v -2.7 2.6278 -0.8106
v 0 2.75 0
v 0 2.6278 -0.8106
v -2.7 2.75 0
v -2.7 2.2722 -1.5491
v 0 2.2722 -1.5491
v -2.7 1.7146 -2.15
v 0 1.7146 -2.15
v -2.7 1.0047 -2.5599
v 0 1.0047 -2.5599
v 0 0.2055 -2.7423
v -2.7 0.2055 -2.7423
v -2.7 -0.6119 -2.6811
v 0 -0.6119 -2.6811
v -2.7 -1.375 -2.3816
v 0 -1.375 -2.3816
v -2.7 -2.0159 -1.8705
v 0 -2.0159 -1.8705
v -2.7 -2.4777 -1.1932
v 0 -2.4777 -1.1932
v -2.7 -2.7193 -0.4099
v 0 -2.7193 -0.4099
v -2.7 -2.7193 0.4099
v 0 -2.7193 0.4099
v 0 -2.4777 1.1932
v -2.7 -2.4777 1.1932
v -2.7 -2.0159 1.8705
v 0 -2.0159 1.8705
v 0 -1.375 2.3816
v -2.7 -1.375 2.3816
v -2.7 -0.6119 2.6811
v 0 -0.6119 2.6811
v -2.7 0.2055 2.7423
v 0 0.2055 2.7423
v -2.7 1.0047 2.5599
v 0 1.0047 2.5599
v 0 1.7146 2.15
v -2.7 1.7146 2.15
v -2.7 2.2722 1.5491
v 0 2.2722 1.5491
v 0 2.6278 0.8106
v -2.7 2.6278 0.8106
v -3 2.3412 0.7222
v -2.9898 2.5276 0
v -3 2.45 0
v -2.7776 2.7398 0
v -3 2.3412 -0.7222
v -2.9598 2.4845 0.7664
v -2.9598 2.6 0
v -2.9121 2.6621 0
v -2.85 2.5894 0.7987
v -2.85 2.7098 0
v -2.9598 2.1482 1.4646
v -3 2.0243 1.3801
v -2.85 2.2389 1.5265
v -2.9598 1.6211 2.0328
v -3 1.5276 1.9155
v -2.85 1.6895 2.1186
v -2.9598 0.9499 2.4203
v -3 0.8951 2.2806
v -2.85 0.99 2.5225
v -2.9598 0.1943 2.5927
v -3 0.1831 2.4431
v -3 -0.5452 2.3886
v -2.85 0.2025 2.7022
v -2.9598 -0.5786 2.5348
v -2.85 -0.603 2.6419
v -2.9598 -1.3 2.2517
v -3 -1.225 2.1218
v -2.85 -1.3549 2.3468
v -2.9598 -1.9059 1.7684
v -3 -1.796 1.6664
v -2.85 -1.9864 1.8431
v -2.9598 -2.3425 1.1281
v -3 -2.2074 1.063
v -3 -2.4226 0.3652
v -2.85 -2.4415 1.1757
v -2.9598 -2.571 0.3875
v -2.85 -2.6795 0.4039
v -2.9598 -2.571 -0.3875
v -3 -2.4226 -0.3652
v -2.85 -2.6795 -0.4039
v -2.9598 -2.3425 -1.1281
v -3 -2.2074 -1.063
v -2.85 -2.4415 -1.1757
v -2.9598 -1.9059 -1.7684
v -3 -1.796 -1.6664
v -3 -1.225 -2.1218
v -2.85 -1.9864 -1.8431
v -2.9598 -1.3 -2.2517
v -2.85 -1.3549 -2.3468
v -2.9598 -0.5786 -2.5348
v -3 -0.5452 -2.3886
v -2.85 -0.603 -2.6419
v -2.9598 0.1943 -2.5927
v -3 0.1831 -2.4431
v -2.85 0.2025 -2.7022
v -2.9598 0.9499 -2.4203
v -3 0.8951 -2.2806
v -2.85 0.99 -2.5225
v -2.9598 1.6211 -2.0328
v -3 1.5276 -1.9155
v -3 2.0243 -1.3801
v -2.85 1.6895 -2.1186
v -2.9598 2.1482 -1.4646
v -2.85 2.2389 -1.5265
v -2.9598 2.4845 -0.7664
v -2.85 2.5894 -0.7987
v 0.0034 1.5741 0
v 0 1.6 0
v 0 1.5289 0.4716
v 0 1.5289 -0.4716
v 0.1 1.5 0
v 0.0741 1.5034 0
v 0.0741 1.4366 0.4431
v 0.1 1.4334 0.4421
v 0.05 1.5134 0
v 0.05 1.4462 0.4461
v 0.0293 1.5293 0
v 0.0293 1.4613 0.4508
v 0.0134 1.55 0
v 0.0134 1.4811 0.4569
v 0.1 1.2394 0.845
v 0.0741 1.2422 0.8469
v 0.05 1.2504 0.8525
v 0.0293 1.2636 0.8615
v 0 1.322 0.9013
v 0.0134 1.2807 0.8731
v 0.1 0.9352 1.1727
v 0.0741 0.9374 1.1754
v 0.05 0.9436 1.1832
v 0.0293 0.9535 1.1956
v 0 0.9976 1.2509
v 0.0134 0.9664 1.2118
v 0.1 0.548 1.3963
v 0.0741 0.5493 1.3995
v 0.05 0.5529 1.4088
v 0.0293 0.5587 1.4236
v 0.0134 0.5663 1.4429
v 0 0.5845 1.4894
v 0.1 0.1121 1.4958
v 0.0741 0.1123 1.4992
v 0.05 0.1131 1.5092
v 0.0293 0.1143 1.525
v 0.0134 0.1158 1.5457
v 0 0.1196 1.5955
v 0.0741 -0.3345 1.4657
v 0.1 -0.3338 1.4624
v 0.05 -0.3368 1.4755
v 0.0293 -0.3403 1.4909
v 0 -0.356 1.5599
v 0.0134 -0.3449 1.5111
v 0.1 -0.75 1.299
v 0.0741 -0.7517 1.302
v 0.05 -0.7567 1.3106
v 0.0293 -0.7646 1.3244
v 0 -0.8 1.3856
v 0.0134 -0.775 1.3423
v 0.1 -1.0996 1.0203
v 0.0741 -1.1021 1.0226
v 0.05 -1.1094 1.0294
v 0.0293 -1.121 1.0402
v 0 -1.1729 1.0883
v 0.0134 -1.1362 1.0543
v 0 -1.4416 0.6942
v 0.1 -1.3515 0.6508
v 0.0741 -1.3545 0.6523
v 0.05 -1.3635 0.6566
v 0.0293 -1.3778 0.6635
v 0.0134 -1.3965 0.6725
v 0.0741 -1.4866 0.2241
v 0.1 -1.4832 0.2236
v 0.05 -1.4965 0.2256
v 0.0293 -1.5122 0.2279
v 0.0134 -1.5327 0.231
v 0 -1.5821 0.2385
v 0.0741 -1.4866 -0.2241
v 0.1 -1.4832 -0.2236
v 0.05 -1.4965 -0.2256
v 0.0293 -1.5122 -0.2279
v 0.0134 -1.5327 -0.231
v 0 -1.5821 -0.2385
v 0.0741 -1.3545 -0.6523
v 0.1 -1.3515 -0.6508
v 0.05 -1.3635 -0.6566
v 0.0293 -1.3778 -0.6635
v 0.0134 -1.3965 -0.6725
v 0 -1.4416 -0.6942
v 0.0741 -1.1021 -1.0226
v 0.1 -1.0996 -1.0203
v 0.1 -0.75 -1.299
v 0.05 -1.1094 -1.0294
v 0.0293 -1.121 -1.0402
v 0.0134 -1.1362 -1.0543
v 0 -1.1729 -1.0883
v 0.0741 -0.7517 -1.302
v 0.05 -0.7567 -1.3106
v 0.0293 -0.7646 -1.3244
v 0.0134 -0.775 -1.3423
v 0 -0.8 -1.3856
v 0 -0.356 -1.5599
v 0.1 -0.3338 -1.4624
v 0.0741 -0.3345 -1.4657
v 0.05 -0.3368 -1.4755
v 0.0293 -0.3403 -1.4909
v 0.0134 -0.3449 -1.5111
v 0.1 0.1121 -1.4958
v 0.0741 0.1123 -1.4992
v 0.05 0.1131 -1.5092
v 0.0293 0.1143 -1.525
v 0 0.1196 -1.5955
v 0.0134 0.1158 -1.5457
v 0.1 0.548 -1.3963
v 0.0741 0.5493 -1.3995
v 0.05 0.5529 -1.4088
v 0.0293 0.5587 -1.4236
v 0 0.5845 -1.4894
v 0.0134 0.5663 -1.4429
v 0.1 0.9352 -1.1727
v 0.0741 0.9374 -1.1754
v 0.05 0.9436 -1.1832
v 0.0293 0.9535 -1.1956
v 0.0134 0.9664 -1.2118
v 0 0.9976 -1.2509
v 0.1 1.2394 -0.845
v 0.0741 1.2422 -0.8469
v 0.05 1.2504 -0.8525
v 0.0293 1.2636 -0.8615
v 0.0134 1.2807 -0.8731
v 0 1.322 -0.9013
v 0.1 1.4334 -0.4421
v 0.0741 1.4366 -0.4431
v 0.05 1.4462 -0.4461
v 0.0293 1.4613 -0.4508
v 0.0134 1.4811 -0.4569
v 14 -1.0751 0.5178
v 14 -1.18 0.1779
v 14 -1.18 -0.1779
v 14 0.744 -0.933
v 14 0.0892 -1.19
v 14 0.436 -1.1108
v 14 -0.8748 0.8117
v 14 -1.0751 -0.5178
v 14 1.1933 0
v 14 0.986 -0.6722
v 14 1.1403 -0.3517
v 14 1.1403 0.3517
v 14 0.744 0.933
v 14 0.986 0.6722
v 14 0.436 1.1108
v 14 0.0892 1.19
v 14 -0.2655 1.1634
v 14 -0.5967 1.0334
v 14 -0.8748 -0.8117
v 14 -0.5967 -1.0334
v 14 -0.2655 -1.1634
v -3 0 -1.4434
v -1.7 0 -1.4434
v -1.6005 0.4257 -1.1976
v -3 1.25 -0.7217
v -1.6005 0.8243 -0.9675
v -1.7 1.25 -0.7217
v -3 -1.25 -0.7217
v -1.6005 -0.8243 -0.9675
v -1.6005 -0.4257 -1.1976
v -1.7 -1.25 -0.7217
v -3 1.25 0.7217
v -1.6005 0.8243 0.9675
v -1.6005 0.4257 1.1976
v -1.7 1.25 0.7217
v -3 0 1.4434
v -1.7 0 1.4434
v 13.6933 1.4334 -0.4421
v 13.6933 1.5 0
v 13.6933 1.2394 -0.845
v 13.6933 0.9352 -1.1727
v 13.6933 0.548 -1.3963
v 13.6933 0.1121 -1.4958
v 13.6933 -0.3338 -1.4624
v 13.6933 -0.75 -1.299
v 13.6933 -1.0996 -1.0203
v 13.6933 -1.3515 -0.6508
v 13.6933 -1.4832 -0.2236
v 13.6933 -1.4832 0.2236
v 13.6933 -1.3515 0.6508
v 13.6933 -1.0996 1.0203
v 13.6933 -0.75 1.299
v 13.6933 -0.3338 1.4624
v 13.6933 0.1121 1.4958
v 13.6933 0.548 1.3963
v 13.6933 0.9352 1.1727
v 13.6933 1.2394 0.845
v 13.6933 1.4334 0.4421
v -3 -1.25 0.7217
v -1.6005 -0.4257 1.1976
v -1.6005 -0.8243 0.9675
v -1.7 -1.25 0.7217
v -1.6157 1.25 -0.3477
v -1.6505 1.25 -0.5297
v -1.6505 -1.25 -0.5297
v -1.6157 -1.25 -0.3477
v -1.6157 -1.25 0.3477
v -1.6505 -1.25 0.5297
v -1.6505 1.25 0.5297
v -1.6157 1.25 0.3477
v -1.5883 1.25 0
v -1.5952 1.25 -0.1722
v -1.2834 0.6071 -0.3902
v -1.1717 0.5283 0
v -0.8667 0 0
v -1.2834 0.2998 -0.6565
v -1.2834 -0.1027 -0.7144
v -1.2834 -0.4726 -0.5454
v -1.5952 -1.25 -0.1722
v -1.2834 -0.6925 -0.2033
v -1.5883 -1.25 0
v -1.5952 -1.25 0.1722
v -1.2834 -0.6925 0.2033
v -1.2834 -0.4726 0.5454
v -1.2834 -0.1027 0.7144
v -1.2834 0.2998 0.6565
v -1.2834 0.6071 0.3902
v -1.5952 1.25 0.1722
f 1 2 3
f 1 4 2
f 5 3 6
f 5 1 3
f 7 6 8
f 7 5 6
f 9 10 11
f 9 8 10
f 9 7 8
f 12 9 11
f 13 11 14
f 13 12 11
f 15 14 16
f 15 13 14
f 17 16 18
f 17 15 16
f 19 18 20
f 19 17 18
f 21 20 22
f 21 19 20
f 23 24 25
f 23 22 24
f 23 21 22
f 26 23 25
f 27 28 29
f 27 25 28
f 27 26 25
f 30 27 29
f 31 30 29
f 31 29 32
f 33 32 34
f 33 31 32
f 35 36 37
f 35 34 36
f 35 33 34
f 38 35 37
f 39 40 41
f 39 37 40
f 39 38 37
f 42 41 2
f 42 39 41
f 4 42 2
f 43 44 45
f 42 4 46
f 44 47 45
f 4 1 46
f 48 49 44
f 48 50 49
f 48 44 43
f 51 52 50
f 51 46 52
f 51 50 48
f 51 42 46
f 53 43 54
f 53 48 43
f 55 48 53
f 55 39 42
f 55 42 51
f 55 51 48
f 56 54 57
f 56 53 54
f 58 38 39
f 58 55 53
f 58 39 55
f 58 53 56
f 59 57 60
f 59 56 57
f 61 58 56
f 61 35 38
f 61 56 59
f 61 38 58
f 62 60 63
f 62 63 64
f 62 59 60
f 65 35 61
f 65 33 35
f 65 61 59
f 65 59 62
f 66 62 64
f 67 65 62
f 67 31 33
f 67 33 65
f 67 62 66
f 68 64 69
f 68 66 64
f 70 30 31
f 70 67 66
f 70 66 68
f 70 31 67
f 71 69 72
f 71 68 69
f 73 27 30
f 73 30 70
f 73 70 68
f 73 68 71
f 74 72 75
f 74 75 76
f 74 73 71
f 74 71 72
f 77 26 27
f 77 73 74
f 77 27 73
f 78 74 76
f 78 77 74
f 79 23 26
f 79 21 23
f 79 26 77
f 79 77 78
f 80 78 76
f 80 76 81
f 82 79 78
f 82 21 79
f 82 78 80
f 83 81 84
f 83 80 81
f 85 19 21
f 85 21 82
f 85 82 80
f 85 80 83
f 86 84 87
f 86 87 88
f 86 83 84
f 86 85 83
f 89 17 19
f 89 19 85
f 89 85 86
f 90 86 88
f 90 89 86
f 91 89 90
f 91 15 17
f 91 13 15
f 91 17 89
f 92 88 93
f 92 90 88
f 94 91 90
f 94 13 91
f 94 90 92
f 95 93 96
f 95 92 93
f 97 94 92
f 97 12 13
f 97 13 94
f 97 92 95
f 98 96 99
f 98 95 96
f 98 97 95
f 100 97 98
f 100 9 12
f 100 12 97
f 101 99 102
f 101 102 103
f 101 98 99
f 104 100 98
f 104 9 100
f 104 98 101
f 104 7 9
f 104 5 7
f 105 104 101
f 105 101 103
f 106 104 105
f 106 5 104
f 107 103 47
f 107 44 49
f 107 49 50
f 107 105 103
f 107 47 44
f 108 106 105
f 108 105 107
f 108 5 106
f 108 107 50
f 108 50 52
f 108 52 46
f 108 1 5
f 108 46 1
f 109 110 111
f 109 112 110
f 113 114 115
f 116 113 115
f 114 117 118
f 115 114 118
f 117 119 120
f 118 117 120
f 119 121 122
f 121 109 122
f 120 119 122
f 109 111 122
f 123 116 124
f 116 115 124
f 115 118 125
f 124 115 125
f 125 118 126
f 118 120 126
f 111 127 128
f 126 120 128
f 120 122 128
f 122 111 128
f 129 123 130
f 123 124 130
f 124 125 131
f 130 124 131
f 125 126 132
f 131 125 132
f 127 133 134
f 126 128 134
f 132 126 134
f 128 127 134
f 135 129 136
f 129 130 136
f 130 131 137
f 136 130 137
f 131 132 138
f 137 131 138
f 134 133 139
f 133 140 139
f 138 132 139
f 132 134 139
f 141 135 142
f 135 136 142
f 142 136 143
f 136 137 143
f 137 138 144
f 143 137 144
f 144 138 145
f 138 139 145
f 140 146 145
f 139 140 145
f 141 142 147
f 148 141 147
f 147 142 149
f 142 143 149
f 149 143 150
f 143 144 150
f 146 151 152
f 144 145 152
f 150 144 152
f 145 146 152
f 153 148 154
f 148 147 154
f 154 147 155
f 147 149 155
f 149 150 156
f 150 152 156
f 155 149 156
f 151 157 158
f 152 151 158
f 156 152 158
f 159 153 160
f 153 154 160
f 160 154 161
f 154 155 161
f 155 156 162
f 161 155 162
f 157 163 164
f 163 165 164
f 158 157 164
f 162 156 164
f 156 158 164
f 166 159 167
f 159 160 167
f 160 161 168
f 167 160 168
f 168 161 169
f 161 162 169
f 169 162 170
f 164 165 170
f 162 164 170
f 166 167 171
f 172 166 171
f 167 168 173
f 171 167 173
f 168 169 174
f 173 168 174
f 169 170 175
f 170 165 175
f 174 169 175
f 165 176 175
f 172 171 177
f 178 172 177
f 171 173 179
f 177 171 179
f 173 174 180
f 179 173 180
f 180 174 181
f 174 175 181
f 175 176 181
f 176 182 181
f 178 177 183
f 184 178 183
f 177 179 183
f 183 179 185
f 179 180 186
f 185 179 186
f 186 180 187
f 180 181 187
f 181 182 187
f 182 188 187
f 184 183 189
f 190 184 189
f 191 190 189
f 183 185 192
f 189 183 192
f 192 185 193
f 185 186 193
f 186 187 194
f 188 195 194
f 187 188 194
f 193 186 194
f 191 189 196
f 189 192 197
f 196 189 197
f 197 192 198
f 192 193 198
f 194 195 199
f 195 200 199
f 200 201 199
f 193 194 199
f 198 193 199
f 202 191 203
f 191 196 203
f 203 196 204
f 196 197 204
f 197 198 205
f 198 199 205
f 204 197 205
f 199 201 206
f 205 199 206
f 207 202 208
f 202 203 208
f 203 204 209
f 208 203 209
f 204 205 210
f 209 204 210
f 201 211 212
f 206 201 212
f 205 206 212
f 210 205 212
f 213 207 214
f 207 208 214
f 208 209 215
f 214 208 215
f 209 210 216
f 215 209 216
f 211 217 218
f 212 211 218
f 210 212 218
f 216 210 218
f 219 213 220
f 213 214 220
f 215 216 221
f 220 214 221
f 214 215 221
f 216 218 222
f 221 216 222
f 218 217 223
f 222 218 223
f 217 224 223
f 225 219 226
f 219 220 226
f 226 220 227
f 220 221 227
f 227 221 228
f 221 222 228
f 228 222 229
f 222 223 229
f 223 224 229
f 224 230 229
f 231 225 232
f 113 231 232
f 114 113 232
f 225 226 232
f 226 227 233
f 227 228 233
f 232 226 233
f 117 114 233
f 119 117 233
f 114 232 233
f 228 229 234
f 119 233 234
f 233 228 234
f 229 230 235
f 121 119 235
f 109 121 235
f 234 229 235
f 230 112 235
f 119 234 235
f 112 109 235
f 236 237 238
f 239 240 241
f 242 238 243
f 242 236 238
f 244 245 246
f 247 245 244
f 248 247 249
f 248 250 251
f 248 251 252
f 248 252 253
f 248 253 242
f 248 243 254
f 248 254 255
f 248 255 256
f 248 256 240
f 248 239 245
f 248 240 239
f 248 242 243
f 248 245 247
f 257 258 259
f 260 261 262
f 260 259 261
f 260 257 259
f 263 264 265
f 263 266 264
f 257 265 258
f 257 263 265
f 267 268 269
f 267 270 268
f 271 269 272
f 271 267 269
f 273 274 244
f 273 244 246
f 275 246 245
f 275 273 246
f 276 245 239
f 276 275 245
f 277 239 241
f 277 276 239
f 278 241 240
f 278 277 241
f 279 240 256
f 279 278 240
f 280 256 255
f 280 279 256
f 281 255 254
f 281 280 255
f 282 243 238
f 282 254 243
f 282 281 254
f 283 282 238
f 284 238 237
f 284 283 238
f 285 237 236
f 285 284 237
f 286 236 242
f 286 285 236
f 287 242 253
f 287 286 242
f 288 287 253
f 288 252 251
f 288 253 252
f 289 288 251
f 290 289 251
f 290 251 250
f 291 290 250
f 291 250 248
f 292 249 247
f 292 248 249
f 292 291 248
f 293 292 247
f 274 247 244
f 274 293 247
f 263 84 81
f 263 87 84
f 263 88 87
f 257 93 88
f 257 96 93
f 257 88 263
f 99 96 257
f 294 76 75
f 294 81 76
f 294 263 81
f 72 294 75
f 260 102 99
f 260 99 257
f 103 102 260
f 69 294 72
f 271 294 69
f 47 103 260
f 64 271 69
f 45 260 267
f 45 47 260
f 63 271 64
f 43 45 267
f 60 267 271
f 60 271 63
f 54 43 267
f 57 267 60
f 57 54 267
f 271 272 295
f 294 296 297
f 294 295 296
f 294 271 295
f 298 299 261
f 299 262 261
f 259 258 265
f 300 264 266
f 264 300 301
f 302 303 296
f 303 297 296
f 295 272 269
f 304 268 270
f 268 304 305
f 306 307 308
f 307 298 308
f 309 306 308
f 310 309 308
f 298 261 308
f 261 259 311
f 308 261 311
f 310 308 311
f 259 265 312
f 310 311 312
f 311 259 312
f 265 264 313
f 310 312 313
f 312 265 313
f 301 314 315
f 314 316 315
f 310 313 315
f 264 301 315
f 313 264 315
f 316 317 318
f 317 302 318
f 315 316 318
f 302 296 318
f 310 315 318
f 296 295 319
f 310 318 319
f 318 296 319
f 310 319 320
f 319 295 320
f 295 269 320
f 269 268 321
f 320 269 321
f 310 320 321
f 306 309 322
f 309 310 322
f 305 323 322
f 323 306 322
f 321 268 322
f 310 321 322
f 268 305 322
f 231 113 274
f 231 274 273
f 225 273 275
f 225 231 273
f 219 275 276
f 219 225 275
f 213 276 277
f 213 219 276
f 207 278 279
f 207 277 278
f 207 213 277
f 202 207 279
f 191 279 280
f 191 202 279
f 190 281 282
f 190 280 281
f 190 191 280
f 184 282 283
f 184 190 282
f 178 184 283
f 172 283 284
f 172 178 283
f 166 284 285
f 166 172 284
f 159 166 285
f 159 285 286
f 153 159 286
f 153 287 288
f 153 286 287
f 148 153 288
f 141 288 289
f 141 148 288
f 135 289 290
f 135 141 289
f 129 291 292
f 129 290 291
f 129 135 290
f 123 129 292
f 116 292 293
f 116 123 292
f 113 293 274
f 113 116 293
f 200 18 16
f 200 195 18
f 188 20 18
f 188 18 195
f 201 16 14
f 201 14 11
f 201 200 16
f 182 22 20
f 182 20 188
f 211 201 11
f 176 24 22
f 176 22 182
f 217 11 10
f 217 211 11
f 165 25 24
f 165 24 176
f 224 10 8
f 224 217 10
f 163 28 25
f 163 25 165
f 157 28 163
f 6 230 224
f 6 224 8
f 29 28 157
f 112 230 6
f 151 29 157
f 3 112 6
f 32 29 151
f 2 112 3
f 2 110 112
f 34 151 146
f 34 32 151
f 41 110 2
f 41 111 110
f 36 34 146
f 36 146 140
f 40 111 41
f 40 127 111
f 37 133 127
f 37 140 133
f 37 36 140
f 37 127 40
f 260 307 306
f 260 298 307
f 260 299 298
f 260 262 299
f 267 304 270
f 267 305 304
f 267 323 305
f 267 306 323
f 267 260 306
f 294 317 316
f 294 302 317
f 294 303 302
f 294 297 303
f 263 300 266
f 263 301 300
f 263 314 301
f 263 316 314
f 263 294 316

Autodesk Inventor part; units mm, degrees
ref_plane "YZ Plane" through (0, 0, 0) normal (1, 0, 0) x (0, 1, 0)
ref_plane "XZ Plane" through (0, 0, 0) normal (0, 1, 0) x (-1, 0, 0)
sketch "Sketch1" plane through (0, 0, 0) normal (0, 0, 1) x (1, 0, 0)
  line L0 (-0.8667, 0) -> (14, 0)
  line L1 (14, 0) -> (14, 1.5)
  line L2 (14, 1.5) -> (0.5, 1.5)
  line L3 (0.5, 1.5) -> (0.1932, 1.5)
  line L4 (0.1932, 1.5) -> (0, 1.5)
  line L5 (0, 1.5) -> (0, 2.75)
  line L6 (0, 2.75) -> (-3, 2.75)
  line L7 (-3, 2.75) -> (-3, 1.4434)
  line L8 (-3, 1.4434) -> (-1.7, 1.4434)
  line L9 (-1.7, 1.4434) -> (-0.8667, 0)
  line L10 (-6.4, 0) -> (17.4, 0) projected
  line L11 (0, -0.55) -> (0, 3.3) projected
  line L12 (0.5, 1.5) -> (0, 1.5) construction
  dimension "d1" = 13.5
  dimension "d2" = 0.3068
  dimension "d3" = 3
  dimension "d4" = 1.3
  dimension "d5" = 60
  dimension "d6" = 3
  dimension "d7" = 3
  dimension "d8" = 2.8868
  dimension "d9" = 5.5
  dimension "d26" = 14
revolve "Body" add sketch "Sketch1" angle 360 about axis through (-0.8667, 0, 0) along (1, 0, 0)
sketch "Sketch2" plane through (-3, 0, 0) normal (-1, 0, 0) x (0, 0, 1)
  circle A0 centre (0, 0) radius 1.4434 projected
  line L0 (0, -3.85) -> (0, 3.85) projected
  line L1 (-3.85, 0) -> (3.85, 0) projected
  line L2 (1.4434, 0) -> (0.7217, -1.25)
  line L3 (0.7217, -1.25) -> (-0.7217, -1.25)
  line L4 (-0.7217, -1.25) -> (-1.4434, 0)
  line L5 (-1.4434, 0) -> (-0.7217, 1.25)
  line L6 (-0.7217, 1.25) -> (0.7217, 1.25)
  line L7 (0.7217, 1.25) -> (1.4434, 0)
extrude "Slot" add sketch "Sketch2" against normal up to next contours L7 A0 | A0 L2 | L6 L0 A0 | A0 L0 L3 | L0 L6 A0 | A0 L3 L0 | L4 A0 | A0 L5
fillet "Fillet1" radius 0.3 1 edges at (-3, -2.75, 0)
thread "Thread" size "M3x0.5" designation "M3" class "6g" standard "GB Metric profile" length 13.5
chamfer "Chamfer1" distance 0.3067 distance2 0.3067 1 edges at (14, -1.5, 0) measured on face at (14, -0.6587, -0.1791)
ref_plane "Work Plane1" through (29, 0, 0) normal (0, -1, 0) x (1, 0, 0)
fillet "Fillet2" radius 0.1 1 edges at (0, -1.5, 0)
equation "\"d1\" = GEL"
equation "\"d3\" = KOH"
equation "\"d4\" = INTI"
equation "\"d6\" = GD"
equation "\"d7\" = BDM"
equation "\"d8\" = 1.1547 * SW"
equation "\"d9\" = KOD"
equation "\"d26\" = NLG"
equation "\"d30\" = R"
equation "\"d17\" = RR"
equation "\"d13\" = GEL"
equation "\"d15\" = -0.5 * SPD + 0.5 * GD"
equation "\"d16\" = GUL"
equation "\"GD\" = NND"
equation "\"NLG\" = 14"
equation "\"GEL\" = 13.5"
equation "\"KOD\" = 5.5"
equation "\"KOH\" = NND"
equation "\"INTI\" = 1.3"
equation "\"GAL\" = 0.61345 * PTC"
equation "\"GUL\" = 0.61345 * PTC"
equation "\"BDM\" = NND"
equation "\"SW\" = 2.5"
equation "\"RR\" = 0.3"
equation "\"SPD\" = NND - 1.2269 * PTC"
equation "\"R\" = 0.1"
equation "\"TOA\" = 30deg"
equation "\"GD1\" = THREADDIA - 1.2269 * PTC"
equation "\"THREADDIA\" = 3"
equation "\"FAWI\" = 45deg"
equation "\"PTC\" = 0.5"
equation "\"NND\" = 3"
equation "\"E0\" = 1.155 * SW"
properties part number "Screw GB/T 70.1 M3 x 14" material "Steel, Mild"
